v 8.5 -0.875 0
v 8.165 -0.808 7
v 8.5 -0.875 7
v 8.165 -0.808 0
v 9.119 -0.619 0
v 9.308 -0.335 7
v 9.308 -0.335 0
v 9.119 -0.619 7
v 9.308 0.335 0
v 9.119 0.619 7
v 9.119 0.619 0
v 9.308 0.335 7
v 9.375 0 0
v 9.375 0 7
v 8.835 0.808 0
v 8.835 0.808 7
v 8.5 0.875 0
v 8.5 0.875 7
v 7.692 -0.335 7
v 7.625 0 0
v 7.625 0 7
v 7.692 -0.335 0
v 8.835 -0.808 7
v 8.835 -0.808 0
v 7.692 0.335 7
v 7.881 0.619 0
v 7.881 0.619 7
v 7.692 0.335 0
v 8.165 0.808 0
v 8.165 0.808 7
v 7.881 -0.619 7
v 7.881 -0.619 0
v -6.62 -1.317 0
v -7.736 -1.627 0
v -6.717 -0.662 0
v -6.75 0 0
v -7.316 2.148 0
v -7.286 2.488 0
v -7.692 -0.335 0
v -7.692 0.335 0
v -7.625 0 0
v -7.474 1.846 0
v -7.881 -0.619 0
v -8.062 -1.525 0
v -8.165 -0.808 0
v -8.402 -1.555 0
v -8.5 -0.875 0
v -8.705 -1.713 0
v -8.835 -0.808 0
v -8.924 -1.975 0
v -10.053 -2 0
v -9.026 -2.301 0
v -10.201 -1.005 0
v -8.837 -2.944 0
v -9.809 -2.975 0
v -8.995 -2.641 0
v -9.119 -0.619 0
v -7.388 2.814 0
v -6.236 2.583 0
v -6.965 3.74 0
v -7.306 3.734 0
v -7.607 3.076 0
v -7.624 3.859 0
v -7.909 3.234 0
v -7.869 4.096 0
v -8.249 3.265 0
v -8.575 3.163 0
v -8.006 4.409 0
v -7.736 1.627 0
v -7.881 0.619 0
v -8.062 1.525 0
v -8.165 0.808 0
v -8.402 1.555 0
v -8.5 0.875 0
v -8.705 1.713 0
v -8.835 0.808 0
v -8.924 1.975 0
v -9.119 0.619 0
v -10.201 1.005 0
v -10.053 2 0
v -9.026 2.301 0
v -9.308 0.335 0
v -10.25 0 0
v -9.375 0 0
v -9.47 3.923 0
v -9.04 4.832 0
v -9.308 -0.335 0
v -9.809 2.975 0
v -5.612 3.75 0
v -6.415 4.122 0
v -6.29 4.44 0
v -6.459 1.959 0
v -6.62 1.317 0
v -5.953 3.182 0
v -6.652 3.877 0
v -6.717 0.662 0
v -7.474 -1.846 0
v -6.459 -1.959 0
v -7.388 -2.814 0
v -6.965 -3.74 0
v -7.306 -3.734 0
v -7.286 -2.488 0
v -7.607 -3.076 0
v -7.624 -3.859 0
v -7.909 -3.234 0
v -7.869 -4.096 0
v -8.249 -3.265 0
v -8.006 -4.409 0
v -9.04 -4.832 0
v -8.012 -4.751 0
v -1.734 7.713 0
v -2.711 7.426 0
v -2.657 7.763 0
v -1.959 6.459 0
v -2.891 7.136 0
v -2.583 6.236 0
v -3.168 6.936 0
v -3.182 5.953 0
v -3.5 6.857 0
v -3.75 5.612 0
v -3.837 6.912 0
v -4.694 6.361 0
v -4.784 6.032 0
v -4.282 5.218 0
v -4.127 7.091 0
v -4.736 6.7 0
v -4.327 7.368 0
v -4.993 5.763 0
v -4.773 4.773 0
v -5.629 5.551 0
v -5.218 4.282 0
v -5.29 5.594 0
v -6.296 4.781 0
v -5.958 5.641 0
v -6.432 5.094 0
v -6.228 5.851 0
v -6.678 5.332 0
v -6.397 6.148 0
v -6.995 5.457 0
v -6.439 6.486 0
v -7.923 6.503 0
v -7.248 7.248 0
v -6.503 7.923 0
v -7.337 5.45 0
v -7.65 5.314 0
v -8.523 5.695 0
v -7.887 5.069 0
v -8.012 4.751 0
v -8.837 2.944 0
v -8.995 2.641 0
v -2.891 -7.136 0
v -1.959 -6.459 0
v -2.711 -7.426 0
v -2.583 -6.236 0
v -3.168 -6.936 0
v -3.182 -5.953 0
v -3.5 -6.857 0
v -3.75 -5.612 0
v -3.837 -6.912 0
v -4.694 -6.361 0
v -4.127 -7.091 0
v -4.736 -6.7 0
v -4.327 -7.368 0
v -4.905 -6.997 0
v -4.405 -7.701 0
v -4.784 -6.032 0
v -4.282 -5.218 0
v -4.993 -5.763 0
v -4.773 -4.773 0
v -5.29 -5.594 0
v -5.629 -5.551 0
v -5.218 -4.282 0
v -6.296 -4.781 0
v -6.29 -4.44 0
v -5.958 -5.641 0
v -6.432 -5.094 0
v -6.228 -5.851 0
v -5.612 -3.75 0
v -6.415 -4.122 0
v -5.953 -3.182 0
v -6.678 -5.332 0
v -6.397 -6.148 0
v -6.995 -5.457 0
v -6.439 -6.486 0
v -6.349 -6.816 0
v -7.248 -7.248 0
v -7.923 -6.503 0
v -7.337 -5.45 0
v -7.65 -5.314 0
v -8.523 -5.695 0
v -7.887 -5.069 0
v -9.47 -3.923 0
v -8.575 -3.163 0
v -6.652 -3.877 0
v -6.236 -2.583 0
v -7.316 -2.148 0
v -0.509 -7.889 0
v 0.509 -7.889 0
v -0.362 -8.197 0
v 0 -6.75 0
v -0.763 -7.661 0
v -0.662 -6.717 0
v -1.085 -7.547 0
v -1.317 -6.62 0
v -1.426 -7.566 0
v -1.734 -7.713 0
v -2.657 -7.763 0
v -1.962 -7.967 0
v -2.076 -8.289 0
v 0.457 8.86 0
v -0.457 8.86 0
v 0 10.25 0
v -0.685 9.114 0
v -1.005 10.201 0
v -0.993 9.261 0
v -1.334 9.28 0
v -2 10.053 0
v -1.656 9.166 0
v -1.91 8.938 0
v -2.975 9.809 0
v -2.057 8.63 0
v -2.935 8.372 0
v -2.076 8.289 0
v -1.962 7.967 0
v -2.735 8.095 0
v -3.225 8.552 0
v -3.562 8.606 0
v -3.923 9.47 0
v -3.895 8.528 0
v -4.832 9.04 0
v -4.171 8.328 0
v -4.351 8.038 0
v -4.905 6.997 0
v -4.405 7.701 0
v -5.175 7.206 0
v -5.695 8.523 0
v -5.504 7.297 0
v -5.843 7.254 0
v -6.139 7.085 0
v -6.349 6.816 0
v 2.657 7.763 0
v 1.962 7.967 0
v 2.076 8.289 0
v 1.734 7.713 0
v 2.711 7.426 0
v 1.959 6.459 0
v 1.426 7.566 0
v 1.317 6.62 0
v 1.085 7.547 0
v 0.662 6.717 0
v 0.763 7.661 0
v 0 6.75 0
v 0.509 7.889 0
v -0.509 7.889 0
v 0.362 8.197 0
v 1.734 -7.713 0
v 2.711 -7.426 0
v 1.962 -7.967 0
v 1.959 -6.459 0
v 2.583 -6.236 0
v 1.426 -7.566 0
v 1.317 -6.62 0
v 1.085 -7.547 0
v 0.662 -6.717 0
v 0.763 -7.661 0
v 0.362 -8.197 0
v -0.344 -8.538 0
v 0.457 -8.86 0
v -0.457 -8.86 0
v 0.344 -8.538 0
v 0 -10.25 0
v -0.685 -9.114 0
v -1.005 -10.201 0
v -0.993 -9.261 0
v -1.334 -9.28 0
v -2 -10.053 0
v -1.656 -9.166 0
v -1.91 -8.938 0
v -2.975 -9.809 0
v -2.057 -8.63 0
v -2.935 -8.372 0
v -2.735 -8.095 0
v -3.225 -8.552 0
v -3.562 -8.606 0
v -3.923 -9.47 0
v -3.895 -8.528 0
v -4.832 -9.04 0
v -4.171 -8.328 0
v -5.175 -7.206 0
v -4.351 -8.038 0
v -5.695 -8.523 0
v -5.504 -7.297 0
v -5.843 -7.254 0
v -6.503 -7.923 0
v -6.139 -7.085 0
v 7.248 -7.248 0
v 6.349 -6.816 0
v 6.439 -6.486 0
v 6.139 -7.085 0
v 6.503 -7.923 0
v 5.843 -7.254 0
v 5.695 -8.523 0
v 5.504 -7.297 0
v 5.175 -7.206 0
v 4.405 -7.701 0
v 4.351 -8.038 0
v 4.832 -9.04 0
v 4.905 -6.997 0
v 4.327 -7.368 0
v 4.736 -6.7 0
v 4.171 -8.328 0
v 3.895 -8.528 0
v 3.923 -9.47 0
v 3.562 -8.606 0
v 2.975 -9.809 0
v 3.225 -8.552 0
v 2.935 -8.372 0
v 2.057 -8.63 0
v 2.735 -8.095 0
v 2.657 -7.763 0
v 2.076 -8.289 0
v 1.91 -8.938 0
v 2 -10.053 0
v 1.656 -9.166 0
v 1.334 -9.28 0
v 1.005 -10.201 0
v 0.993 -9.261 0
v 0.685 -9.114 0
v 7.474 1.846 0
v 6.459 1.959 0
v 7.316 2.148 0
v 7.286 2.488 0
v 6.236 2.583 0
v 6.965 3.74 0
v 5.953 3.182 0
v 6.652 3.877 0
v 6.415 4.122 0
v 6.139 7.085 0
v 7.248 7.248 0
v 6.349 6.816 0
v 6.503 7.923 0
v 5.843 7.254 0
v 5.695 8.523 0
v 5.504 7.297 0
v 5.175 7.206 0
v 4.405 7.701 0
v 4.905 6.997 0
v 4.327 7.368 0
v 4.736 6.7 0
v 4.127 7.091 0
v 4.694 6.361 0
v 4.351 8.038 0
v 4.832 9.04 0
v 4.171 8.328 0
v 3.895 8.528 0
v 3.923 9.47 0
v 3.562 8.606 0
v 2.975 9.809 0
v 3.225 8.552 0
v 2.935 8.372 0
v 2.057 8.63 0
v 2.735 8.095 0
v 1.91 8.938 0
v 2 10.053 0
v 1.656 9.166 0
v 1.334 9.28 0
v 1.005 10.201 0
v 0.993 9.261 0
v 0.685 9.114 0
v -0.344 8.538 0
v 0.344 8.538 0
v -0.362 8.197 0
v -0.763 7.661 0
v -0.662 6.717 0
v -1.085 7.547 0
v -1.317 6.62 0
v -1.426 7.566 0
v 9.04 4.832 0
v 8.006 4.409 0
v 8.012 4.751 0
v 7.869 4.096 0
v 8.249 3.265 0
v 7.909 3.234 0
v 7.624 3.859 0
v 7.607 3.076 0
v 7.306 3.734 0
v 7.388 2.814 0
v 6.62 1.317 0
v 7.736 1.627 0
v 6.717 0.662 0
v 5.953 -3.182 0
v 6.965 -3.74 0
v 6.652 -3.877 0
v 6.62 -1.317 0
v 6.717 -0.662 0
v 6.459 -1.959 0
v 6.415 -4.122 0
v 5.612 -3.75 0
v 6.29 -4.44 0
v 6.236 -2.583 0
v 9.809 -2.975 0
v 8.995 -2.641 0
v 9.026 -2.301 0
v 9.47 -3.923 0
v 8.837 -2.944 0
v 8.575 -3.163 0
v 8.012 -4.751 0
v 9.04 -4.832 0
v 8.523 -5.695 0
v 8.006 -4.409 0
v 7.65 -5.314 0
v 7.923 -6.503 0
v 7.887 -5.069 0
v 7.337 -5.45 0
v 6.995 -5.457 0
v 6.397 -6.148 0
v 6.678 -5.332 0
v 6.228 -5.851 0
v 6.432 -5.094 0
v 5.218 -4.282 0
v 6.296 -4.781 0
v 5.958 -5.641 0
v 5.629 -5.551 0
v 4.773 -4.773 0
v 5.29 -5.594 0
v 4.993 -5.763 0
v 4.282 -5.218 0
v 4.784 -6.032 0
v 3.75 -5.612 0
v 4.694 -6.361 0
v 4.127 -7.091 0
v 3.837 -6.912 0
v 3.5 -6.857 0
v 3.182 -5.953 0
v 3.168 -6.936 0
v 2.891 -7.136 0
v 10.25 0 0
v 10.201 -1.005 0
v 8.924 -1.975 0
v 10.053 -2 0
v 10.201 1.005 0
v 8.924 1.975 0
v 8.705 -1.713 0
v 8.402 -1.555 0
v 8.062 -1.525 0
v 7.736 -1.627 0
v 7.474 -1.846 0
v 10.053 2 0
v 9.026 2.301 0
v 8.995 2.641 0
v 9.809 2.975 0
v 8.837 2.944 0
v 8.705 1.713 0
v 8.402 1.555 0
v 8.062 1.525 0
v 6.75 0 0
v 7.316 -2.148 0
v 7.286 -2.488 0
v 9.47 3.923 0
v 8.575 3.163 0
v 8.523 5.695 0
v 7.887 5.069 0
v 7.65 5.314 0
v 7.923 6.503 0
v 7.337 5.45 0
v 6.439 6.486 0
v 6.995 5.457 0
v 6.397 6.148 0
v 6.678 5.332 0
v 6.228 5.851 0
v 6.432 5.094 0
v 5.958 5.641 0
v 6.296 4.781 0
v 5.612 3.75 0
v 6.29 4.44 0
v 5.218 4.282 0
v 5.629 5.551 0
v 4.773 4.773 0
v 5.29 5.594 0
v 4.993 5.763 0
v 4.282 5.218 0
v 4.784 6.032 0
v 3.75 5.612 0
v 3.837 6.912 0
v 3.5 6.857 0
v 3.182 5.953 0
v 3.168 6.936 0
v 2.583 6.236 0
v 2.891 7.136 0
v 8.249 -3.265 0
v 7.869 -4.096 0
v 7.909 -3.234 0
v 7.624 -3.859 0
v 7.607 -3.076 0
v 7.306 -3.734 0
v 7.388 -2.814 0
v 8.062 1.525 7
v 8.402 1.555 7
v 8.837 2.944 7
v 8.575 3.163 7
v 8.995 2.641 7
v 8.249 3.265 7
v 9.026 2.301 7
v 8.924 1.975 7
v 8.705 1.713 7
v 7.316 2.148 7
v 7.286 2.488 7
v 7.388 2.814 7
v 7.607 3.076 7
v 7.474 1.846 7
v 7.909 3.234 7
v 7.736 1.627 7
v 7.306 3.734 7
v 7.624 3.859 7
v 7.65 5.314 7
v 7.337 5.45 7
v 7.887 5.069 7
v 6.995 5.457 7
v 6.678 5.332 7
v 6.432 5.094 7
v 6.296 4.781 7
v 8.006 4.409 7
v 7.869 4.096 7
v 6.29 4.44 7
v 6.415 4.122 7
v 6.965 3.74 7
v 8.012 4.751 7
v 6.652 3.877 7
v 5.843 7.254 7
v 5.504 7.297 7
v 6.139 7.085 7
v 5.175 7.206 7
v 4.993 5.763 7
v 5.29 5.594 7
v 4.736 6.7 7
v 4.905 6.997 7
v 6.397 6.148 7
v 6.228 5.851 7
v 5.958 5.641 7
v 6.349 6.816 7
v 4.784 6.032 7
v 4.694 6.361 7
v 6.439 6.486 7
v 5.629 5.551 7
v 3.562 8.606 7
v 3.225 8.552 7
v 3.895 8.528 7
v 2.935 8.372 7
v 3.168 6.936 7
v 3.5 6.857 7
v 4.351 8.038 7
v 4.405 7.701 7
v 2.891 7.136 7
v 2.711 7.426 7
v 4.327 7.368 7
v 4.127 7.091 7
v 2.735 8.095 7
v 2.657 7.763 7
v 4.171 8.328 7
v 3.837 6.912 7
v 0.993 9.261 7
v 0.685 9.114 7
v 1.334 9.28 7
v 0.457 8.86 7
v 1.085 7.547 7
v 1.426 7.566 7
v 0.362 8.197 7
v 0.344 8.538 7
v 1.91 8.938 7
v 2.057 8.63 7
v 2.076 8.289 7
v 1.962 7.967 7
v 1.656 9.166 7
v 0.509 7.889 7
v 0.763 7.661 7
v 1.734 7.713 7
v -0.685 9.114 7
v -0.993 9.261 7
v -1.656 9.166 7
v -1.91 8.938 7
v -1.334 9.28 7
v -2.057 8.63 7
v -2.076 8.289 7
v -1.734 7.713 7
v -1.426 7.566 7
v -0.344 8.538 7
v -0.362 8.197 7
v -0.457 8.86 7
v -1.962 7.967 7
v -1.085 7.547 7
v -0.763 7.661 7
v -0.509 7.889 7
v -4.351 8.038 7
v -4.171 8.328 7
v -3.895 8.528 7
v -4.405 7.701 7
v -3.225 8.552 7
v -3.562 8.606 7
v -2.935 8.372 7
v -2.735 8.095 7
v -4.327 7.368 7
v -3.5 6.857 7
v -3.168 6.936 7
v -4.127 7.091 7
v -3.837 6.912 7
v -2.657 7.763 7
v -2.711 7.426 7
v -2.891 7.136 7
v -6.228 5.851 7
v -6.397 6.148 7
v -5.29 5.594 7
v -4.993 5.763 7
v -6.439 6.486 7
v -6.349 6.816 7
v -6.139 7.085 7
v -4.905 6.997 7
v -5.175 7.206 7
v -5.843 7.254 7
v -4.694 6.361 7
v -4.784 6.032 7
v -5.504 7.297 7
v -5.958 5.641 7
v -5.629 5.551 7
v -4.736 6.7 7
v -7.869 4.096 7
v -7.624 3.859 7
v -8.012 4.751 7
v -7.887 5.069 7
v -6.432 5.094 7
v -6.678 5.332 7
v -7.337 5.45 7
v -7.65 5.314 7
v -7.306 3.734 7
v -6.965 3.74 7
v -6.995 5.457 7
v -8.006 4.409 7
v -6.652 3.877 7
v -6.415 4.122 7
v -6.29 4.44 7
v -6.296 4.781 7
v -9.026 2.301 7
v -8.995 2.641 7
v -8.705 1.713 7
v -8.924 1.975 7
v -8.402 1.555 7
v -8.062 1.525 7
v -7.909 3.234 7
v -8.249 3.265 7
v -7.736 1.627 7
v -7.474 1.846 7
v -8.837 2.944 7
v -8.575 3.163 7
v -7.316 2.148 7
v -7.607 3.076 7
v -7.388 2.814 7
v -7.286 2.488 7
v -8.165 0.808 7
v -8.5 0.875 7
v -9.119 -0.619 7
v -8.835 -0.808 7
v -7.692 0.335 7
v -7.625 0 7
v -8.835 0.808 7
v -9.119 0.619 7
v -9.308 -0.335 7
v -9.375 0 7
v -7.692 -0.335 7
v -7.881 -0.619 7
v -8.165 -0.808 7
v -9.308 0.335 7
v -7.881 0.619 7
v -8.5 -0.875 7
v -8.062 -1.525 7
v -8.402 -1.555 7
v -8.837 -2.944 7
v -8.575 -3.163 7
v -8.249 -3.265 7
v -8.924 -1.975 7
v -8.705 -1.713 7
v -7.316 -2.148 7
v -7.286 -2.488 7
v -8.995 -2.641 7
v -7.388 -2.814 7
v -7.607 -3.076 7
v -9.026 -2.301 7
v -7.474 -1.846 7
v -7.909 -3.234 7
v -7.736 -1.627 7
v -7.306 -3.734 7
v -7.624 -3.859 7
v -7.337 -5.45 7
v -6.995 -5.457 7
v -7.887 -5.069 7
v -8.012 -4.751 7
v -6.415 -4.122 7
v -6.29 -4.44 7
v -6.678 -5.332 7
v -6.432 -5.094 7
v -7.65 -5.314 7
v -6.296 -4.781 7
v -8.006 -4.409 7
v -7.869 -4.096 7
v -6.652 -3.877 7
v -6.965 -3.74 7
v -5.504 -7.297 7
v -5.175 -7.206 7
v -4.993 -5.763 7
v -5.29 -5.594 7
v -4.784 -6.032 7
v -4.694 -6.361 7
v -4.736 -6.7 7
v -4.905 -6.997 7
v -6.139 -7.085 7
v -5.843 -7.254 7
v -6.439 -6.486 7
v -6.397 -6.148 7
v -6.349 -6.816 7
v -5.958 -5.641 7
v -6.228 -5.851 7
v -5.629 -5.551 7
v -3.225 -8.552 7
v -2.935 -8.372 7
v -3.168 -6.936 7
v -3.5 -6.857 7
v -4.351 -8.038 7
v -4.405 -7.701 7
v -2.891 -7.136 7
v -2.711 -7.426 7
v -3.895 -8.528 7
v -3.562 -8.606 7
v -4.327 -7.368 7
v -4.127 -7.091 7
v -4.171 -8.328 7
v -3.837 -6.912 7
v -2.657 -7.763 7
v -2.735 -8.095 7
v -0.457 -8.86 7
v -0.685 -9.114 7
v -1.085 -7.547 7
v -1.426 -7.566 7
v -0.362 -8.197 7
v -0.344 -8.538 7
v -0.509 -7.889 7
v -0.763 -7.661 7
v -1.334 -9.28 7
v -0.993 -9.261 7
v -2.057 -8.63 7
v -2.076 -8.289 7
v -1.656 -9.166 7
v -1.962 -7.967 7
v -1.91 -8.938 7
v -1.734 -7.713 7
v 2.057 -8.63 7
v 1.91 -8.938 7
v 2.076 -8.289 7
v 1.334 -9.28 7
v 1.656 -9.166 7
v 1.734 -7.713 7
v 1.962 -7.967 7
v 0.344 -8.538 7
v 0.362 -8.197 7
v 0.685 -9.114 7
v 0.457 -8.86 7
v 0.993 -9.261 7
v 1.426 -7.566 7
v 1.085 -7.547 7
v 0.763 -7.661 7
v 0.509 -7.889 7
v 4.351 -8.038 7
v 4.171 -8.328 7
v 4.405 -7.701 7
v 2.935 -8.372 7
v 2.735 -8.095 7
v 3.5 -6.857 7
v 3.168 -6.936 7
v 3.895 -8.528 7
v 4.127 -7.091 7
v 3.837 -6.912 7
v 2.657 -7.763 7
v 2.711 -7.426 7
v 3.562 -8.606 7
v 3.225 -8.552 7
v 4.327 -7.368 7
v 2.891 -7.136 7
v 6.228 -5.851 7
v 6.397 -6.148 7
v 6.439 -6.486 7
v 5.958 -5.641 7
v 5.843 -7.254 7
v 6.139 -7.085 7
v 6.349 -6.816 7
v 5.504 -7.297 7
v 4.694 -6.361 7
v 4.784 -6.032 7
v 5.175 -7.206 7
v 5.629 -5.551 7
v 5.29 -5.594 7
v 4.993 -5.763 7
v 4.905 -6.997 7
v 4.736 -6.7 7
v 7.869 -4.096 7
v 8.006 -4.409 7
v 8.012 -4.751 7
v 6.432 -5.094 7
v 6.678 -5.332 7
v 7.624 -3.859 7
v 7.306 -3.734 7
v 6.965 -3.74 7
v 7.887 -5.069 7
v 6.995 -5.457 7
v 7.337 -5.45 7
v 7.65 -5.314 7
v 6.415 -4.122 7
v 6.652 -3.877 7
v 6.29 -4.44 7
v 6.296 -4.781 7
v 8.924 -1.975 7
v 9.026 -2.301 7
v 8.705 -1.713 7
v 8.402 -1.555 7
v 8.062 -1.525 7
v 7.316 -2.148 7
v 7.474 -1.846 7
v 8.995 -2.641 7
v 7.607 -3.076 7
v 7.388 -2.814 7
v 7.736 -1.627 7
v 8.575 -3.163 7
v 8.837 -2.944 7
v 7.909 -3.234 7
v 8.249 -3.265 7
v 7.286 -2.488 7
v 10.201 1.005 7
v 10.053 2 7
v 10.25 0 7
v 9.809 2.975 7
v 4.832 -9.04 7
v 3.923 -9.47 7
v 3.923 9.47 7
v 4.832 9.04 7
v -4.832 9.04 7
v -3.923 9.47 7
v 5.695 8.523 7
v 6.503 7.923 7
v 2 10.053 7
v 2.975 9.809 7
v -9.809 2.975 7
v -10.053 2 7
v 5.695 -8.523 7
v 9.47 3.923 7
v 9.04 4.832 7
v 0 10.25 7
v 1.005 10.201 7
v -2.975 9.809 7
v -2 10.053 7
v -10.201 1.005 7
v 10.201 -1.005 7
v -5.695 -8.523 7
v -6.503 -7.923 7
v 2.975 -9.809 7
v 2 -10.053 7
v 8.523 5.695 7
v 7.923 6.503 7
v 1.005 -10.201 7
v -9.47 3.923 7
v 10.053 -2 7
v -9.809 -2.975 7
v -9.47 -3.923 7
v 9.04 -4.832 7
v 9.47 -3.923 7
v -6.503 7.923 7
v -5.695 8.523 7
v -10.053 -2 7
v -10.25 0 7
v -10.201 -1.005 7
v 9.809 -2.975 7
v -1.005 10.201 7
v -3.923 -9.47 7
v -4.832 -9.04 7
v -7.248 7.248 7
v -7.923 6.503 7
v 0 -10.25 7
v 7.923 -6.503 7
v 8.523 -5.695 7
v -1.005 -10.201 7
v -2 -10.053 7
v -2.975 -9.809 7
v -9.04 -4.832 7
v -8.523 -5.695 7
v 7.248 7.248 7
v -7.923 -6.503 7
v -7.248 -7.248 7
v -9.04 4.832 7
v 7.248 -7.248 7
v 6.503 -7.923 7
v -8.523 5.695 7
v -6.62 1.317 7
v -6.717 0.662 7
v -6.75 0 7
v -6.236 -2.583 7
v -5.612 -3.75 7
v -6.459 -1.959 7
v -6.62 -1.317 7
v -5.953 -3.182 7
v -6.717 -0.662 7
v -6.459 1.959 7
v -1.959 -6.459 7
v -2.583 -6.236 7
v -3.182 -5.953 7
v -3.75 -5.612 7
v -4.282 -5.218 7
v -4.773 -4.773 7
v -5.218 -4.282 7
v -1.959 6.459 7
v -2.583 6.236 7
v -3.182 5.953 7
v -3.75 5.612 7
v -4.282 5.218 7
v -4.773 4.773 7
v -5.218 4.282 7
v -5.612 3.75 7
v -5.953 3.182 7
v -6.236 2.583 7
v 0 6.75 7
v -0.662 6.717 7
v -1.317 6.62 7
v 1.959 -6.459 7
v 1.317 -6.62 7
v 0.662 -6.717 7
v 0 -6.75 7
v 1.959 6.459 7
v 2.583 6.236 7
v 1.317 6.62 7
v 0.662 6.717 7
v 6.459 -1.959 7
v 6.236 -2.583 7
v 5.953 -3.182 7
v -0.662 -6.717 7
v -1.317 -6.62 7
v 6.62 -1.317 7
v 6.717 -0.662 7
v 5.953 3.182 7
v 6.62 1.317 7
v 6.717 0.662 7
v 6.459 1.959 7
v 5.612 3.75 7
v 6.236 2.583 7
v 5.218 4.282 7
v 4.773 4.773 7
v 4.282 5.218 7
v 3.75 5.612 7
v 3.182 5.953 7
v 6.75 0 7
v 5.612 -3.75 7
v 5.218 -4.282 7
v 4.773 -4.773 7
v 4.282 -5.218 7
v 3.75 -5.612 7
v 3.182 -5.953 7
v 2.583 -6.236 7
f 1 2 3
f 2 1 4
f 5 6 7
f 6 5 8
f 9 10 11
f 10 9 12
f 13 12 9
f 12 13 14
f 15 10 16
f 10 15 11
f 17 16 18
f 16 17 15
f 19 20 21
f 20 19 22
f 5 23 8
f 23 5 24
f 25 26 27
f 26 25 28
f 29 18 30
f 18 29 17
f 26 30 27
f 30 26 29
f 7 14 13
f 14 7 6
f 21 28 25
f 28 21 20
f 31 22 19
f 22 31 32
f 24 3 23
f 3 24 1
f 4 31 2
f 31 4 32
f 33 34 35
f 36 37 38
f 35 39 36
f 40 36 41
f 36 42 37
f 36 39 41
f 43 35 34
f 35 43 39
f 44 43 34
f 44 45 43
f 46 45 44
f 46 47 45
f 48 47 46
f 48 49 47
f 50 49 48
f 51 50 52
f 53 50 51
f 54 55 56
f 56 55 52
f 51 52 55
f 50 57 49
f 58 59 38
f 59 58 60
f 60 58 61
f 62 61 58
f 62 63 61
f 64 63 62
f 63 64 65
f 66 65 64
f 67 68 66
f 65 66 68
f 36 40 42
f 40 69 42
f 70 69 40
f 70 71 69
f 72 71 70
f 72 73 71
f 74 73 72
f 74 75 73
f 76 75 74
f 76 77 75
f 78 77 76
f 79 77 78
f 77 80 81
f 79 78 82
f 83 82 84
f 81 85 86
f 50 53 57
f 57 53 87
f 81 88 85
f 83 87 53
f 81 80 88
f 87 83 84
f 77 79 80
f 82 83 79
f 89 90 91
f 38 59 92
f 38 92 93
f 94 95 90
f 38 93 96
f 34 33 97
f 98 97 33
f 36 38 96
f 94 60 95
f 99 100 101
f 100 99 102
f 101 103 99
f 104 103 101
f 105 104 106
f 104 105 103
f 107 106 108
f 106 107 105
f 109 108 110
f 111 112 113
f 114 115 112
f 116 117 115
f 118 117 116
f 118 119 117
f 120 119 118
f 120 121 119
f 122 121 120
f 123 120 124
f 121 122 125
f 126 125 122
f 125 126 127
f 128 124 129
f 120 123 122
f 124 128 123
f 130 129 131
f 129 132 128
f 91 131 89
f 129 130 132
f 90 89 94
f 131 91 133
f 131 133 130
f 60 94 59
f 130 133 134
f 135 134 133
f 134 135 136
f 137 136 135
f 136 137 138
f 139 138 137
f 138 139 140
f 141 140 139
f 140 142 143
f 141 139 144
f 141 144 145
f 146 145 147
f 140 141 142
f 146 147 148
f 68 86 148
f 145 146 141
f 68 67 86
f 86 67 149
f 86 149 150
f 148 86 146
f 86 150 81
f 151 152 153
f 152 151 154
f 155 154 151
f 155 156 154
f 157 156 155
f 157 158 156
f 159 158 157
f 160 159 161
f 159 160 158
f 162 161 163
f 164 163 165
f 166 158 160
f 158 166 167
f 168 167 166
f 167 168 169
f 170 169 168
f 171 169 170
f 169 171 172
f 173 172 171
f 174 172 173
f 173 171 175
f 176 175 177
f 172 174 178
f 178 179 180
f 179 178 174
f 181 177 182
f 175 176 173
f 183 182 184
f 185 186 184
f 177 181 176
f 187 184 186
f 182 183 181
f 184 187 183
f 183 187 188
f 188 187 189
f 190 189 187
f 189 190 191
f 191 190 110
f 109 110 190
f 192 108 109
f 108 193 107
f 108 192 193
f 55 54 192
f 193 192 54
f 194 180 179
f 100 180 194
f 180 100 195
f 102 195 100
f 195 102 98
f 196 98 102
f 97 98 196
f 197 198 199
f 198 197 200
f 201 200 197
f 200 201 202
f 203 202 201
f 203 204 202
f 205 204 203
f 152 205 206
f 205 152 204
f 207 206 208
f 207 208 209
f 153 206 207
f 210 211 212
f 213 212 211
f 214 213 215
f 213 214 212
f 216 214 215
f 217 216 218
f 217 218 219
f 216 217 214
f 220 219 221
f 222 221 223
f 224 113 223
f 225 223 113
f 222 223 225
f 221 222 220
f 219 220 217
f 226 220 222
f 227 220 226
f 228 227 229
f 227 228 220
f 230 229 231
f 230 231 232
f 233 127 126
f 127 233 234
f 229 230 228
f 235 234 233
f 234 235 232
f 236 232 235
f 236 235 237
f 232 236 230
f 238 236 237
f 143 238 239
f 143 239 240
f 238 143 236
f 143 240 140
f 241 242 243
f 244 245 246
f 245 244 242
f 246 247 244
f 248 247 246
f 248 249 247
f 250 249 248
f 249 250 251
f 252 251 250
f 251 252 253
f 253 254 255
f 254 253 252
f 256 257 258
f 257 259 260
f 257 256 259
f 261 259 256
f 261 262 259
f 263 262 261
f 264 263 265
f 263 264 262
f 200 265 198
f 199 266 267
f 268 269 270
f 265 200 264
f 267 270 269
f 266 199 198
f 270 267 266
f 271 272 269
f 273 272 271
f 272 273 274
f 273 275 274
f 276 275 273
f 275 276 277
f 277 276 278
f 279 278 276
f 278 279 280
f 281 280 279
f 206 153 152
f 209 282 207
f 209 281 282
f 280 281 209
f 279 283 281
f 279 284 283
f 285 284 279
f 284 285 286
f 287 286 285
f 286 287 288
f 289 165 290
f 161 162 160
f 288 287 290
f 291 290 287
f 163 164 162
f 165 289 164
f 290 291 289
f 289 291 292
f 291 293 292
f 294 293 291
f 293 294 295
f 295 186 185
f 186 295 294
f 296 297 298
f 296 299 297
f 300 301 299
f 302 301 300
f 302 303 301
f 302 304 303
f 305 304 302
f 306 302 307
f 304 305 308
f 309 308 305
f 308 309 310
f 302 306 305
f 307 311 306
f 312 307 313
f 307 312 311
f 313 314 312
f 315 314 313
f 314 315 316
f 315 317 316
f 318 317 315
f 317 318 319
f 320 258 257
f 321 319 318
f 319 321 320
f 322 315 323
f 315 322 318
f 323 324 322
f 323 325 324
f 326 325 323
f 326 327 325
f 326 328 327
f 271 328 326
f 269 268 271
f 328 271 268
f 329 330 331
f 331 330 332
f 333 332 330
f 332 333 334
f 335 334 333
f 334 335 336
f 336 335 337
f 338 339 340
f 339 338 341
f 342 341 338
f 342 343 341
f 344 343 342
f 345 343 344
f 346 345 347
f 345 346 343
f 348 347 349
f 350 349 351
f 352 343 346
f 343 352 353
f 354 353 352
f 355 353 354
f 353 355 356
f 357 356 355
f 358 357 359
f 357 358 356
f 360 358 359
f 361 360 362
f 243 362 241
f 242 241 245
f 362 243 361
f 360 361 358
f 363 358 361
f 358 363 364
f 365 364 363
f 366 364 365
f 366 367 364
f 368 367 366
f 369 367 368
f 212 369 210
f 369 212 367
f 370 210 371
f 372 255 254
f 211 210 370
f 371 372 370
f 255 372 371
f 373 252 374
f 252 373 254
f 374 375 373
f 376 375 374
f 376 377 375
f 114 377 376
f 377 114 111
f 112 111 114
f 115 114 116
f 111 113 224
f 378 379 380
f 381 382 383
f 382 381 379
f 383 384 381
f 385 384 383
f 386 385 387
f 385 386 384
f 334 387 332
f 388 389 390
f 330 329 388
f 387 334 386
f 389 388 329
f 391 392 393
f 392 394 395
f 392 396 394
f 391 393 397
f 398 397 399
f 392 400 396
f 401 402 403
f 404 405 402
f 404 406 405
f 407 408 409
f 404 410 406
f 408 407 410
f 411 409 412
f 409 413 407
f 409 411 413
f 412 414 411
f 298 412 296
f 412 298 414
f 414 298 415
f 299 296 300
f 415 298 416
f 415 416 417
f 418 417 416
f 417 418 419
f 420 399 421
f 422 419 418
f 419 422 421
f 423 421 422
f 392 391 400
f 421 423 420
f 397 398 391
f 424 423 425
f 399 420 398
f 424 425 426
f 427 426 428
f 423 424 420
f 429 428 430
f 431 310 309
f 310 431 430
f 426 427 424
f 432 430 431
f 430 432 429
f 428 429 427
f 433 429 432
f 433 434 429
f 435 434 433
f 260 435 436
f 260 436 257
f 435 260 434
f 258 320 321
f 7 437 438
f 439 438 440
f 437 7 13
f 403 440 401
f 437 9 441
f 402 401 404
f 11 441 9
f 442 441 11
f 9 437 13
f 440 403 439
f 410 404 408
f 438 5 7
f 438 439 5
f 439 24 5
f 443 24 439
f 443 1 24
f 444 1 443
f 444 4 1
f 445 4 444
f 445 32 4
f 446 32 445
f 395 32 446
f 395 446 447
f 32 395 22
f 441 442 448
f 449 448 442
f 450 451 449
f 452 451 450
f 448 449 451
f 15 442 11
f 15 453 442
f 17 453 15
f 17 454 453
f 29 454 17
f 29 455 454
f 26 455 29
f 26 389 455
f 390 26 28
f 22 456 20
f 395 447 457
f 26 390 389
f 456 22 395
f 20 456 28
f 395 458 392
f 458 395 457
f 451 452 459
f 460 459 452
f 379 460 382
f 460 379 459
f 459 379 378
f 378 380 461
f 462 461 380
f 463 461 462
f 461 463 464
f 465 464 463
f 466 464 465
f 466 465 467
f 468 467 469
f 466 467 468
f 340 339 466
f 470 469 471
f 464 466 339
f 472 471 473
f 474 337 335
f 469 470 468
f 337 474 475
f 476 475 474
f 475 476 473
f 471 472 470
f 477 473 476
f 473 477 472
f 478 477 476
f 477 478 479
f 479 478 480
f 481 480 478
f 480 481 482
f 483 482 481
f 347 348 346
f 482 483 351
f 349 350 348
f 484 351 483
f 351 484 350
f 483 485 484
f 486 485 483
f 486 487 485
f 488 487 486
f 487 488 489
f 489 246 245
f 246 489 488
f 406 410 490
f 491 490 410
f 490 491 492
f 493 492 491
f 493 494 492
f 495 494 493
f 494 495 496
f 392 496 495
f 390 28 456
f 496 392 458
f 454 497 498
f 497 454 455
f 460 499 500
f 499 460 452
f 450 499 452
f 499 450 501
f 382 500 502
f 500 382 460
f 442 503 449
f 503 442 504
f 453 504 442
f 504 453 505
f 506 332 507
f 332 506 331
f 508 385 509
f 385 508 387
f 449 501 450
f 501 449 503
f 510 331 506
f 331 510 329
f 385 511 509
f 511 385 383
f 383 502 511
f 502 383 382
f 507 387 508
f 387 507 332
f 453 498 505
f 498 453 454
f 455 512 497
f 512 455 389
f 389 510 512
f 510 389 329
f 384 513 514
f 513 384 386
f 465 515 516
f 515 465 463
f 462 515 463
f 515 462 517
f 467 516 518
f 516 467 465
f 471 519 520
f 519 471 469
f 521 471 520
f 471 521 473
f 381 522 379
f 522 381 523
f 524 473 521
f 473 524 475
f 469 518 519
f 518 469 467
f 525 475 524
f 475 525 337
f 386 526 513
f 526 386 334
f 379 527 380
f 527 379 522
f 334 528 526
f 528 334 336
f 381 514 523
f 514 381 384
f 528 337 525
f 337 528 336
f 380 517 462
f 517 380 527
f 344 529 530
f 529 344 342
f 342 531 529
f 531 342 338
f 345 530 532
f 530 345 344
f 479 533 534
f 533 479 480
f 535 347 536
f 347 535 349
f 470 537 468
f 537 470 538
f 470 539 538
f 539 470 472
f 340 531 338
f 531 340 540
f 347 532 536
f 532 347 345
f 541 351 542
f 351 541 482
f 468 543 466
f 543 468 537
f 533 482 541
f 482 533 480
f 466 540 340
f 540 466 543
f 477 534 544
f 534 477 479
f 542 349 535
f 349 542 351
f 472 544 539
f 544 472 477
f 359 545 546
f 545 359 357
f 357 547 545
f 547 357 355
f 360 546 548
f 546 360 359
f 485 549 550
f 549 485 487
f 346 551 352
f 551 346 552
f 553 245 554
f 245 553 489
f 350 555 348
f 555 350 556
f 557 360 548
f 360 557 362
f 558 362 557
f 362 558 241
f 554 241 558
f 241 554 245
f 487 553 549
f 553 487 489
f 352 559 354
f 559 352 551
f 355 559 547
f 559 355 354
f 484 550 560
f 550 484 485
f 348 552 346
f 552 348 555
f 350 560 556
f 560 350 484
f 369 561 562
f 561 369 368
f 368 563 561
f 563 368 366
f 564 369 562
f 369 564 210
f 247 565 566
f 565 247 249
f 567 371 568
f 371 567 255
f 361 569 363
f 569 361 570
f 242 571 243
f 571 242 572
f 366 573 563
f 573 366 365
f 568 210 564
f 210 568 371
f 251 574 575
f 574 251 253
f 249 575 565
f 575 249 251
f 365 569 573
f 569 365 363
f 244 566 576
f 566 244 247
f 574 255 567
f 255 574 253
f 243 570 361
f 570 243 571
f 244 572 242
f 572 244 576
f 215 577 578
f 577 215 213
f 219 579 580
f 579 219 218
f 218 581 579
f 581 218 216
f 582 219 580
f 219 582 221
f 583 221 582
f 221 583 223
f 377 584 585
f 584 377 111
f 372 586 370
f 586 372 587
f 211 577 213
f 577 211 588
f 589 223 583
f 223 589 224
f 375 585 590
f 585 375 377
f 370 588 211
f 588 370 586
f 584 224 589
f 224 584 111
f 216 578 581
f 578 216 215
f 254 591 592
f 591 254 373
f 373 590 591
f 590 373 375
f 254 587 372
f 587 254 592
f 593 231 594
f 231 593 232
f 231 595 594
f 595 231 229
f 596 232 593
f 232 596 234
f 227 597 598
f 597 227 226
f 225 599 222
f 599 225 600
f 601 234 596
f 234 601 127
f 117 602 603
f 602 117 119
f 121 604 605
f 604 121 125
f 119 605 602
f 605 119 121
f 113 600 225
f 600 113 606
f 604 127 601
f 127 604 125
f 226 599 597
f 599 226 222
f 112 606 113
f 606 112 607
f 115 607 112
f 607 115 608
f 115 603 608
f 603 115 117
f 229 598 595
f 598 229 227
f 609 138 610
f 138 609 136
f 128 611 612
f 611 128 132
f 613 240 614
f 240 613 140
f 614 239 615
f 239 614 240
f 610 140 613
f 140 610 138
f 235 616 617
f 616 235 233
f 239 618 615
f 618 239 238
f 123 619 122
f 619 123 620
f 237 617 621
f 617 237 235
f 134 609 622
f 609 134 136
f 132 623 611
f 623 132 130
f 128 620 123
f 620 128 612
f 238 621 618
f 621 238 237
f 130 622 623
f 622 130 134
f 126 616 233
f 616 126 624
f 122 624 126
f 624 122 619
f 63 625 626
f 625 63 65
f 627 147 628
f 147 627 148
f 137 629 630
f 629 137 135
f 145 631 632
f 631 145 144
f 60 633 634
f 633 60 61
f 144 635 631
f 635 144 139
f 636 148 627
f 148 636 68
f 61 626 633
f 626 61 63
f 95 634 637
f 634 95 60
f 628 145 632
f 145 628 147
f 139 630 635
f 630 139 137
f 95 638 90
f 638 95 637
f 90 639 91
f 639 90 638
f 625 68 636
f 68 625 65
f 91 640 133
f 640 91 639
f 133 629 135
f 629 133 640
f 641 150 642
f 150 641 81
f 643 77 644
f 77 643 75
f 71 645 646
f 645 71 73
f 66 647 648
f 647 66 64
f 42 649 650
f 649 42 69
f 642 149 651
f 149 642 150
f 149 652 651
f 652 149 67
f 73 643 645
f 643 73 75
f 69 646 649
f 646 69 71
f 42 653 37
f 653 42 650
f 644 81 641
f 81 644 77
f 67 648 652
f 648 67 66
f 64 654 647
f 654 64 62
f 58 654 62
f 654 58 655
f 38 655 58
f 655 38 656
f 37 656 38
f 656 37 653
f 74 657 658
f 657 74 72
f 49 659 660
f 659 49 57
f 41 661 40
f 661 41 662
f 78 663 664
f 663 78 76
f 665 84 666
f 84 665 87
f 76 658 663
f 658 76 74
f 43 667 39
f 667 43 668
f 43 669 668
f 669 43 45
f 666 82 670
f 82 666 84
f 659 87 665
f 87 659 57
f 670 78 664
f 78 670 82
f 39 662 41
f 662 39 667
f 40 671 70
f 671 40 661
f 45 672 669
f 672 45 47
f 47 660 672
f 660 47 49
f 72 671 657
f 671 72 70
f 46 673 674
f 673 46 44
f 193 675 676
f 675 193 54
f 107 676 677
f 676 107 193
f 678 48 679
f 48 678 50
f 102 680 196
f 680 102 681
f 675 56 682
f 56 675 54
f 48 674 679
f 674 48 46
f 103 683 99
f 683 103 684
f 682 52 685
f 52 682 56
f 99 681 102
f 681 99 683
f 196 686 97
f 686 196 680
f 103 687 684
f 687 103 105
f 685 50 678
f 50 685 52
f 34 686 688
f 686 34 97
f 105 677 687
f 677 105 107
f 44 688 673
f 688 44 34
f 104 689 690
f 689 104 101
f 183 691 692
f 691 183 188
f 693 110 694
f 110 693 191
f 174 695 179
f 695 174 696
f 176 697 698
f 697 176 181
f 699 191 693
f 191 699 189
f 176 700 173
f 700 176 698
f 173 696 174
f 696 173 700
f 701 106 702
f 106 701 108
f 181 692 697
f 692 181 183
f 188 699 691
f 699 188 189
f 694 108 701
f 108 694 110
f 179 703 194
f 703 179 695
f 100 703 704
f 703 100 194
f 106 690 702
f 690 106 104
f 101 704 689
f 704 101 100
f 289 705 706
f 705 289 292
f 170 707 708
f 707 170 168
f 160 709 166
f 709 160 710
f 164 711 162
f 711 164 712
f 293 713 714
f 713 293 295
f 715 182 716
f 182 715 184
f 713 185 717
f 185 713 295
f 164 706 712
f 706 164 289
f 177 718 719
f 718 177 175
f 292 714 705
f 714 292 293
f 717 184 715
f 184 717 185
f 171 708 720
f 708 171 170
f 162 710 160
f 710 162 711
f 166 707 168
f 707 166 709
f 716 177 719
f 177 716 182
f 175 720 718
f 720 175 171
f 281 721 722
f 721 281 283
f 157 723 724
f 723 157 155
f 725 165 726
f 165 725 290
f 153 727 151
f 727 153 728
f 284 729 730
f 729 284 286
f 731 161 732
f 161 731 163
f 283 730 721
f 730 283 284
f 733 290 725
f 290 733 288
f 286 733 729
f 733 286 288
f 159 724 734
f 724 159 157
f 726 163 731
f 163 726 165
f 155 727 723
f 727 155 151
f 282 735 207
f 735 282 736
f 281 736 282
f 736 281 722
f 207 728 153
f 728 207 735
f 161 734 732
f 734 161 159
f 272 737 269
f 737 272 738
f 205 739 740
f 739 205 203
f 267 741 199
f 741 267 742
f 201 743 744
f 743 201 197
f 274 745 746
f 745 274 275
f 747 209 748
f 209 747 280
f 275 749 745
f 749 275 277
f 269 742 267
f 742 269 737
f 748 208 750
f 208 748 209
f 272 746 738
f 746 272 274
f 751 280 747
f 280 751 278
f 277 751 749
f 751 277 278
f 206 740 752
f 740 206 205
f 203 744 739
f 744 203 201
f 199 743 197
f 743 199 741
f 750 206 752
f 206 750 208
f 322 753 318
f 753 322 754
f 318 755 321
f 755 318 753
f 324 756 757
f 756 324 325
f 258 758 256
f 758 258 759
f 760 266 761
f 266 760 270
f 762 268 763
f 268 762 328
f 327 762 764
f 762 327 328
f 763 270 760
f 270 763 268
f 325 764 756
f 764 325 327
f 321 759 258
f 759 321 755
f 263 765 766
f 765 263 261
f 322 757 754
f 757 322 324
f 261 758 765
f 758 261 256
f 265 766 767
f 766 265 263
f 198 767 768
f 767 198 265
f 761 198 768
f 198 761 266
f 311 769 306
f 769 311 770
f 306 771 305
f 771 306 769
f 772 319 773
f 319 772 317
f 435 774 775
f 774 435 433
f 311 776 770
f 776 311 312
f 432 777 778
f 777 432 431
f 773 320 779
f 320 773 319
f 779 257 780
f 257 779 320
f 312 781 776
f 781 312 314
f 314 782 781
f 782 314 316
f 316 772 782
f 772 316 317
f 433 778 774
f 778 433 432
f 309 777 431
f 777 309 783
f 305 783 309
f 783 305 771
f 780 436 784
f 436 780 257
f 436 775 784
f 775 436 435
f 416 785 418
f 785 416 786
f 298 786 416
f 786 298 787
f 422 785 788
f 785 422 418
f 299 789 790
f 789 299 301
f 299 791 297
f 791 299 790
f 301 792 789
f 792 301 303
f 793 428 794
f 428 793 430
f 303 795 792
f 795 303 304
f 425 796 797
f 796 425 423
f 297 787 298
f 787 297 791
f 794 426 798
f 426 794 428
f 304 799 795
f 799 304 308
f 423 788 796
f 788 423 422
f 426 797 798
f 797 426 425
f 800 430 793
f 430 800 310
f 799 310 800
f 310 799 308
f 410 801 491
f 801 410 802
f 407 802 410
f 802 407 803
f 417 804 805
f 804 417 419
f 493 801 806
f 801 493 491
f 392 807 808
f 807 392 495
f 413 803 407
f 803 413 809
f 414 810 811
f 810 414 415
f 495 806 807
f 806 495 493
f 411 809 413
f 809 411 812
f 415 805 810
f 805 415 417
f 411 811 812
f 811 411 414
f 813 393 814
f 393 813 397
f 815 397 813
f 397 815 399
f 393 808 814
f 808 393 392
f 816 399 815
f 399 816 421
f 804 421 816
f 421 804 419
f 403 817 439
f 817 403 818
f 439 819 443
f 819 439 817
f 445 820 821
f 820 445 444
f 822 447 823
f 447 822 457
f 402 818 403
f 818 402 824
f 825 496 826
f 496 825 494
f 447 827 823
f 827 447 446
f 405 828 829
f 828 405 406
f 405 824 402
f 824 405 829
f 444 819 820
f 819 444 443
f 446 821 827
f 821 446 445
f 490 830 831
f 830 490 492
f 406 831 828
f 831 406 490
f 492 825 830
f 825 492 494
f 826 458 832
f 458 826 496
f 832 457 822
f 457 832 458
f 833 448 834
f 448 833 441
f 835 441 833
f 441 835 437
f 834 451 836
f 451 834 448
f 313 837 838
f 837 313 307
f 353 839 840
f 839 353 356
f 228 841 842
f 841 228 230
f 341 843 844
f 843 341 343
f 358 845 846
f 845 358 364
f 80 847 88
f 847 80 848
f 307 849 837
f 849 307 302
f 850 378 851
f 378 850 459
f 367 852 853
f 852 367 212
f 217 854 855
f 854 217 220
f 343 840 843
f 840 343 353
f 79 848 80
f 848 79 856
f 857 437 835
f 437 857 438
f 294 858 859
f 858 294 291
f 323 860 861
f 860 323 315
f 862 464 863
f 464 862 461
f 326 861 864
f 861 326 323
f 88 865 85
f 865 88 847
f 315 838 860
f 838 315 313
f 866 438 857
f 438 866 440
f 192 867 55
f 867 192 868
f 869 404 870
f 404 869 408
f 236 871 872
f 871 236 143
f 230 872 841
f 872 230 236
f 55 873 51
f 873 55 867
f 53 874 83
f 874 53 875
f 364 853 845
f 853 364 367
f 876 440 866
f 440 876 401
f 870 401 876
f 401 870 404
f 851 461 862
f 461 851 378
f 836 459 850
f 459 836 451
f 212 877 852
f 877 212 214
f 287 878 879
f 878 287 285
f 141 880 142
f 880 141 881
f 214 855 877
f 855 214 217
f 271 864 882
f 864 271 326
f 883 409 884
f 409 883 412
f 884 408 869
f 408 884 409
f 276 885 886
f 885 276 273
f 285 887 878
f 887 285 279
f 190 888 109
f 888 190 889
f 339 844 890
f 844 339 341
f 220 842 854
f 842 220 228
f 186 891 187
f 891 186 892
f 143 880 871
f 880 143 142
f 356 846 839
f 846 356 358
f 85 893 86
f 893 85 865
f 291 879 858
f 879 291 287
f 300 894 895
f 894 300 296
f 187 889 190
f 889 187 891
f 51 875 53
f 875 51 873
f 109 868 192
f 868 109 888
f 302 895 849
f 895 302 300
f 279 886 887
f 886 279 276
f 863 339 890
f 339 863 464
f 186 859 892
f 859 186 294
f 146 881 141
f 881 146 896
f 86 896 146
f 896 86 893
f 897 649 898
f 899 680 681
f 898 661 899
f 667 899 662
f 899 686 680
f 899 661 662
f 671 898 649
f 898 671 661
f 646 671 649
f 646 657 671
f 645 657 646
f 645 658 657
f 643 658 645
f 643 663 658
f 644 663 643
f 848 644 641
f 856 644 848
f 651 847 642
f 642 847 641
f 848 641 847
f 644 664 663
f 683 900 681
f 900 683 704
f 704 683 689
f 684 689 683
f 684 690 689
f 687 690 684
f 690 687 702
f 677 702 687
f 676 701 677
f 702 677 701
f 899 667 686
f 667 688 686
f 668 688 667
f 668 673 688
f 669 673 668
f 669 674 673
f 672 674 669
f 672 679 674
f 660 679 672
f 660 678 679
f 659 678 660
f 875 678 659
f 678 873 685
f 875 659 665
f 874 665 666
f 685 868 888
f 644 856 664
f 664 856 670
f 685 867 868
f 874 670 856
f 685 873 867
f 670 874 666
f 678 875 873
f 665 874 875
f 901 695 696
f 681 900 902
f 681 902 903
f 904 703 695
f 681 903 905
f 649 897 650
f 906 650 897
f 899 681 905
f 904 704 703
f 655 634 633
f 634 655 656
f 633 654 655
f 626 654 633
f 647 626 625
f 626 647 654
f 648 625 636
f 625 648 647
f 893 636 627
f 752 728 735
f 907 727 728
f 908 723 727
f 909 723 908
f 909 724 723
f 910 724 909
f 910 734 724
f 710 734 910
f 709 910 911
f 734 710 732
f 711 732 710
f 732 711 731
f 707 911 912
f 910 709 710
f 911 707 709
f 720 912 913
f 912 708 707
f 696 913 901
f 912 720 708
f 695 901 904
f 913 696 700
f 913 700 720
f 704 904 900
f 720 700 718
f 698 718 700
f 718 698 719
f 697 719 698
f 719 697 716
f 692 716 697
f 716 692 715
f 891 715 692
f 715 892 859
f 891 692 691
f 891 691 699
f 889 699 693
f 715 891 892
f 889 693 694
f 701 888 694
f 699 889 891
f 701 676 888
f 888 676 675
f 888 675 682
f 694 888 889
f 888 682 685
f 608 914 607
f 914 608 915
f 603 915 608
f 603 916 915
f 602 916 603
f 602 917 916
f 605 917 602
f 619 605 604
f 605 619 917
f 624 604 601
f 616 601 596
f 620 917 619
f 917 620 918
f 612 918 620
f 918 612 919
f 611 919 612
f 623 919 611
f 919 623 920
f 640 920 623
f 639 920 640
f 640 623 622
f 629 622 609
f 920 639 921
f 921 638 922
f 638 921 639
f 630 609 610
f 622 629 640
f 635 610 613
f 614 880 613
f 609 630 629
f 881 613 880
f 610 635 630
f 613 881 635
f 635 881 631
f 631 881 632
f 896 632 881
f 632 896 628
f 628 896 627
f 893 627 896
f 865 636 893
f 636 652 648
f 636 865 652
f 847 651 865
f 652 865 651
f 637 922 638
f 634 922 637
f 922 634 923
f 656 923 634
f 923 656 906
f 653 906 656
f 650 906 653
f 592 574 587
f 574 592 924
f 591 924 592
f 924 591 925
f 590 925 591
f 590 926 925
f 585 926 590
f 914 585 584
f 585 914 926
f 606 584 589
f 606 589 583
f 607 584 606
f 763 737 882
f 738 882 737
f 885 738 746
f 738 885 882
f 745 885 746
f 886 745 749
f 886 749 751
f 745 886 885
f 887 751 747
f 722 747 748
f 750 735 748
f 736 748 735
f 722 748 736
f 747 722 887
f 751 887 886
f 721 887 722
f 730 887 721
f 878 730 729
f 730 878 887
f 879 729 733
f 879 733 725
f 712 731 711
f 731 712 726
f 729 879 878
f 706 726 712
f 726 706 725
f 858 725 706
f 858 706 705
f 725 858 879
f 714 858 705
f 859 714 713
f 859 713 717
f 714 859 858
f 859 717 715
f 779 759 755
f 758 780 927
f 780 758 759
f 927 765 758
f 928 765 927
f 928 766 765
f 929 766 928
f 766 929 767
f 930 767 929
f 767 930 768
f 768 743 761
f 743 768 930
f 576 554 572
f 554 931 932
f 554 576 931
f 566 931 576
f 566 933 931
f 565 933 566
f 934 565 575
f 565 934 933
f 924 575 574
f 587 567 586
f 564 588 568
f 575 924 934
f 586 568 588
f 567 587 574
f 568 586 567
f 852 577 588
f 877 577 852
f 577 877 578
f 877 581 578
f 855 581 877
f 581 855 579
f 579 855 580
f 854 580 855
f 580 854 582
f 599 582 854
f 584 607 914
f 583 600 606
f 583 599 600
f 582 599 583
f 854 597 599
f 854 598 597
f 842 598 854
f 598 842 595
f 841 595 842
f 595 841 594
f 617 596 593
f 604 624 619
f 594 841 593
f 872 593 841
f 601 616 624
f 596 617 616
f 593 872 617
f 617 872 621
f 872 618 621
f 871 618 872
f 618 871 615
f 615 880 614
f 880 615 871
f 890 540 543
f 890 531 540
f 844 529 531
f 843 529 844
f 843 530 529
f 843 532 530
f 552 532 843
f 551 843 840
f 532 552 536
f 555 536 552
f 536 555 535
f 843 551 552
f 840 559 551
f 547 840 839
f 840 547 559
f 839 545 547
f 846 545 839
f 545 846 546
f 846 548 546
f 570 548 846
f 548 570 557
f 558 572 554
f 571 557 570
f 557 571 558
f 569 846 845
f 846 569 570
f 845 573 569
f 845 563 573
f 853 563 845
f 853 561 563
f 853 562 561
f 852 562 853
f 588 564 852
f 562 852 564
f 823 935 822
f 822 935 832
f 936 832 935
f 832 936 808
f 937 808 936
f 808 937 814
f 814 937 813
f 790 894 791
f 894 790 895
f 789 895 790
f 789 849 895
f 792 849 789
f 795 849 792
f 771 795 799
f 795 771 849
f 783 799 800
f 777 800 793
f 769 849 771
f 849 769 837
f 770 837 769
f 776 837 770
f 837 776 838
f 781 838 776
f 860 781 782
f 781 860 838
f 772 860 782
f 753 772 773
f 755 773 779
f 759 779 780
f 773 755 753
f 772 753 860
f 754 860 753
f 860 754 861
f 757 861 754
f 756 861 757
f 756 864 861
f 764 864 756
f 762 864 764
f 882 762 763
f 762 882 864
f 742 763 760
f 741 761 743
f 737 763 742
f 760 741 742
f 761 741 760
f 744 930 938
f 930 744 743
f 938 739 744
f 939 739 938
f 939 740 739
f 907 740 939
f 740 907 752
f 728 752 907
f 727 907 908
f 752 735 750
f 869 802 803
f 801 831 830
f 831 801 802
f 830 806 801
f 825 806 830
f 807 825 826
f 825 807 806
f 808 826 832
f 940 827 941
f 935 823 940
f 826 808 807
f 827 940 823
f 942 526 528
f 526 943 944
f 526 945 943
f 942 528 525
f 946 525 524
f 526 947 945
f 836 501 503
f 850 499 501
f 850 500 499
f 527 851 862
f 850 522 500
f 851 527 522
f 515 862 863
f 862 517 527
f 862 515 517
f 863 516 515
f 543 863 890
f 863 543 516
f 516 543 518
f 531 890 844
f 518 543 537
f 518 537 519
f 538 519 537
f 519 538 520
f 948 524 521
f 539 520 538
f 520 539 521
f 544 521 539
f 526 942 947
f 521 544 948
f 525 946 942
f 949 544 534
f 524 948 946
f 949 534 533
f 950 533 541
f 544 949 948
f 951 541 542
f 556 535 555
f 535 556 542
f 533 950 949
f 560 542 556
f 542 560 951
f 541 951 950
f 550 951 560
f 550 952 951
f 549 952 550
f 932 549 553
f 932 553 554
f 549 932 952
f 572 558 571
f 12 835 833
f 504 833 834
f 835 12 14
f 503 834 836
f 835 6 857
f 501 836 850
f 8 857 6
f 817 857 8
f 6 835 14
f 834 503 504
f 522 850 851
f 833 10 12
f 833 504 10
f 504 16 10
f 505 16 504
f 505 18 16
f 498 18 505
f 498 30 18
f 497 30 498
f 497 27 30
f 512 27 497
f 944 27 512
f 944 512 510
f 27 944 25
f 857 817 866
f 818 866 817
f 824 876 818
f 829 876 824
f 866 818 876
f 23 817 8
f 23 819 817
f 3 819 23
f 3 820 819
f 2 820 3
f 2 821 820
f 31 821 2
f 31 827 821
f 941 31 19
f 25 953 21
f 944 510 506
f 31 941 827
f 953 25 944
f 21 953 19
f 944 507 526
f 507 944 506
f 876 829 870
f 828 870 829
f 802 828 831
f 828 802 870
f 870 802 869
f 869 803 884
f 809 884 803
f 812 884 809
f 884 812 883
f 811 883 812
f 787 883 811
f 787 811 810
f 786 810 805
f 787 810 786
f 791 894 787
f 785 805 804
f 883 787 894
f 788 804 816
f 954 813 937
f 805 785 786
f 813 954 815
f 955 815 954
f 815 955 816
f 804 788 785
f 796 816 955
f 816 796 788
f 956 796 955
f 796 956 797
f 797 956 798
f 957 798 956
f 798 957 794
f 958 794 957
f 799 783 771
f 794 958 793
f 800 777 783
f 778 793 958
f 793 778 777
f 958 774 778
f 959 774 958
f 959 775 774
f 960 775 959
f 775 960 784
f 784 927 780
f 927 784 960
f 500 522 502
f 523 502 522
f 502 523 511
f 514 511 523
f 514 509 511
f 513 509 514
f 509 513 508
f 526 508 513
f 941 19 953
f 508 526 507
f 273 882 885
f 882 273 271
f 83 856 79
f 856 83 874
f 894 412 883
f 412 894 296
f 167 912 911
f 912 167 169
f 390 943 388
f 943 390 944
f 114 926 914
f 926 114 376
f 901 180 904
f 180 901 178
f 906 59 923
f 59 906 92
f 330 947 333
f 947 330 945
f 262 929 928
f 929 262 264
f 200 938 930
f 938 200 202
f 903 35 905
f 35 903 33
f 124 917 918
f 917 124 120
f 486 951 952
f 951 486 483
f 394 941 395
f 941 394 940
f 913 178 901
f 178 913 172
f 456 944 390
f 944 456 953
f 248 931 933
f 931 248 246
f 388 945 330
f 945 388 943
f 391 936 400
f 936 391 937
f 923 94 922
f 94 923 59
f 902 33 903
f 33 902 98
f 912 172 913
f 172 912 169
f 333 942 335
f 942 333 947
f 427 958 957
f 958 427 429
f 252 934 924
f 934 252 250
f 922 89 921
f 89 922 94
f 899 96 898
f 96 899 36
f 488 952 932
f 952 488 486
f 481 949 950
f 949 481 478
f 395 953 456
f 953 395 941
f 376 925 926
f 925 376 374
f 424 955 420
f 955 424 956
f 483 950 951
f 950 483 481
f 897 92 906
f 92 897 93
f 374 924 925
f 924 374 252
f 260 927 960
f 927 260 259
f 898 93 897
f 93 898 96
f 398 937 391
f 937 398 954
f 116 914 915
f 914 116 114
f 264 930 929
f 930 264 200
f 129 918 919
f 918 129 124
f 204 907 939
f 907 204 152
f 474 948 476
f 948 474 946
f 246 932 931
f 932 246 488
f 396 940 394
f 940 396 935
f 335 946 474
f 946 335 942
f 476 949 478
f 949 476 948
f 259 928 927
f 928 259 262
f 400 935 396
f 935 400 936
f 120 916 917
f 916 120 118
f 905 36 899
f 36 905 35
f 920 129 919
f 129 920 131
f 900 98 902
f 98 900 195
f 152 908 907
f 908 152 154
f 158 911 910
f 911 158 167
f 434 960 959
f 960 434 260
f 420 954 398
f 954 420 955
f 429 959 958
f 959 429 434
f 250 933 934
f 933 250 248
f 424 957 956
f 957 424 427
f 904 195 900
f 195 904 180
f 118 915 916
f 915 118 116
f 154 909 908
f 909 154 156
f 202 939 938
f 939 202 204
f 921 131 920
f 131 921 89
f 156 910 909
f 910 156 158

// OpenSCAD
pin_ring_diameter=17;
pin_size=1.75;
pin_count=22;
height=7;

difference()
{
cylinder(r=(pin_ring_diameter/2)+(2*(pin_size/2)),h=height,$fn=64);

cylinder(r=(pin_ring_diameter/2)-(2*(pin_size/2)),h=height+1,$fn=64);

for (i=[0:(360/pin_count):360])
{
	rotate([0,0,i])
	translate([(pin_ring_diameter/2),0,0])
	cylinder(r=(pin_size/2),h=height+1, $fn=16);
}

}
